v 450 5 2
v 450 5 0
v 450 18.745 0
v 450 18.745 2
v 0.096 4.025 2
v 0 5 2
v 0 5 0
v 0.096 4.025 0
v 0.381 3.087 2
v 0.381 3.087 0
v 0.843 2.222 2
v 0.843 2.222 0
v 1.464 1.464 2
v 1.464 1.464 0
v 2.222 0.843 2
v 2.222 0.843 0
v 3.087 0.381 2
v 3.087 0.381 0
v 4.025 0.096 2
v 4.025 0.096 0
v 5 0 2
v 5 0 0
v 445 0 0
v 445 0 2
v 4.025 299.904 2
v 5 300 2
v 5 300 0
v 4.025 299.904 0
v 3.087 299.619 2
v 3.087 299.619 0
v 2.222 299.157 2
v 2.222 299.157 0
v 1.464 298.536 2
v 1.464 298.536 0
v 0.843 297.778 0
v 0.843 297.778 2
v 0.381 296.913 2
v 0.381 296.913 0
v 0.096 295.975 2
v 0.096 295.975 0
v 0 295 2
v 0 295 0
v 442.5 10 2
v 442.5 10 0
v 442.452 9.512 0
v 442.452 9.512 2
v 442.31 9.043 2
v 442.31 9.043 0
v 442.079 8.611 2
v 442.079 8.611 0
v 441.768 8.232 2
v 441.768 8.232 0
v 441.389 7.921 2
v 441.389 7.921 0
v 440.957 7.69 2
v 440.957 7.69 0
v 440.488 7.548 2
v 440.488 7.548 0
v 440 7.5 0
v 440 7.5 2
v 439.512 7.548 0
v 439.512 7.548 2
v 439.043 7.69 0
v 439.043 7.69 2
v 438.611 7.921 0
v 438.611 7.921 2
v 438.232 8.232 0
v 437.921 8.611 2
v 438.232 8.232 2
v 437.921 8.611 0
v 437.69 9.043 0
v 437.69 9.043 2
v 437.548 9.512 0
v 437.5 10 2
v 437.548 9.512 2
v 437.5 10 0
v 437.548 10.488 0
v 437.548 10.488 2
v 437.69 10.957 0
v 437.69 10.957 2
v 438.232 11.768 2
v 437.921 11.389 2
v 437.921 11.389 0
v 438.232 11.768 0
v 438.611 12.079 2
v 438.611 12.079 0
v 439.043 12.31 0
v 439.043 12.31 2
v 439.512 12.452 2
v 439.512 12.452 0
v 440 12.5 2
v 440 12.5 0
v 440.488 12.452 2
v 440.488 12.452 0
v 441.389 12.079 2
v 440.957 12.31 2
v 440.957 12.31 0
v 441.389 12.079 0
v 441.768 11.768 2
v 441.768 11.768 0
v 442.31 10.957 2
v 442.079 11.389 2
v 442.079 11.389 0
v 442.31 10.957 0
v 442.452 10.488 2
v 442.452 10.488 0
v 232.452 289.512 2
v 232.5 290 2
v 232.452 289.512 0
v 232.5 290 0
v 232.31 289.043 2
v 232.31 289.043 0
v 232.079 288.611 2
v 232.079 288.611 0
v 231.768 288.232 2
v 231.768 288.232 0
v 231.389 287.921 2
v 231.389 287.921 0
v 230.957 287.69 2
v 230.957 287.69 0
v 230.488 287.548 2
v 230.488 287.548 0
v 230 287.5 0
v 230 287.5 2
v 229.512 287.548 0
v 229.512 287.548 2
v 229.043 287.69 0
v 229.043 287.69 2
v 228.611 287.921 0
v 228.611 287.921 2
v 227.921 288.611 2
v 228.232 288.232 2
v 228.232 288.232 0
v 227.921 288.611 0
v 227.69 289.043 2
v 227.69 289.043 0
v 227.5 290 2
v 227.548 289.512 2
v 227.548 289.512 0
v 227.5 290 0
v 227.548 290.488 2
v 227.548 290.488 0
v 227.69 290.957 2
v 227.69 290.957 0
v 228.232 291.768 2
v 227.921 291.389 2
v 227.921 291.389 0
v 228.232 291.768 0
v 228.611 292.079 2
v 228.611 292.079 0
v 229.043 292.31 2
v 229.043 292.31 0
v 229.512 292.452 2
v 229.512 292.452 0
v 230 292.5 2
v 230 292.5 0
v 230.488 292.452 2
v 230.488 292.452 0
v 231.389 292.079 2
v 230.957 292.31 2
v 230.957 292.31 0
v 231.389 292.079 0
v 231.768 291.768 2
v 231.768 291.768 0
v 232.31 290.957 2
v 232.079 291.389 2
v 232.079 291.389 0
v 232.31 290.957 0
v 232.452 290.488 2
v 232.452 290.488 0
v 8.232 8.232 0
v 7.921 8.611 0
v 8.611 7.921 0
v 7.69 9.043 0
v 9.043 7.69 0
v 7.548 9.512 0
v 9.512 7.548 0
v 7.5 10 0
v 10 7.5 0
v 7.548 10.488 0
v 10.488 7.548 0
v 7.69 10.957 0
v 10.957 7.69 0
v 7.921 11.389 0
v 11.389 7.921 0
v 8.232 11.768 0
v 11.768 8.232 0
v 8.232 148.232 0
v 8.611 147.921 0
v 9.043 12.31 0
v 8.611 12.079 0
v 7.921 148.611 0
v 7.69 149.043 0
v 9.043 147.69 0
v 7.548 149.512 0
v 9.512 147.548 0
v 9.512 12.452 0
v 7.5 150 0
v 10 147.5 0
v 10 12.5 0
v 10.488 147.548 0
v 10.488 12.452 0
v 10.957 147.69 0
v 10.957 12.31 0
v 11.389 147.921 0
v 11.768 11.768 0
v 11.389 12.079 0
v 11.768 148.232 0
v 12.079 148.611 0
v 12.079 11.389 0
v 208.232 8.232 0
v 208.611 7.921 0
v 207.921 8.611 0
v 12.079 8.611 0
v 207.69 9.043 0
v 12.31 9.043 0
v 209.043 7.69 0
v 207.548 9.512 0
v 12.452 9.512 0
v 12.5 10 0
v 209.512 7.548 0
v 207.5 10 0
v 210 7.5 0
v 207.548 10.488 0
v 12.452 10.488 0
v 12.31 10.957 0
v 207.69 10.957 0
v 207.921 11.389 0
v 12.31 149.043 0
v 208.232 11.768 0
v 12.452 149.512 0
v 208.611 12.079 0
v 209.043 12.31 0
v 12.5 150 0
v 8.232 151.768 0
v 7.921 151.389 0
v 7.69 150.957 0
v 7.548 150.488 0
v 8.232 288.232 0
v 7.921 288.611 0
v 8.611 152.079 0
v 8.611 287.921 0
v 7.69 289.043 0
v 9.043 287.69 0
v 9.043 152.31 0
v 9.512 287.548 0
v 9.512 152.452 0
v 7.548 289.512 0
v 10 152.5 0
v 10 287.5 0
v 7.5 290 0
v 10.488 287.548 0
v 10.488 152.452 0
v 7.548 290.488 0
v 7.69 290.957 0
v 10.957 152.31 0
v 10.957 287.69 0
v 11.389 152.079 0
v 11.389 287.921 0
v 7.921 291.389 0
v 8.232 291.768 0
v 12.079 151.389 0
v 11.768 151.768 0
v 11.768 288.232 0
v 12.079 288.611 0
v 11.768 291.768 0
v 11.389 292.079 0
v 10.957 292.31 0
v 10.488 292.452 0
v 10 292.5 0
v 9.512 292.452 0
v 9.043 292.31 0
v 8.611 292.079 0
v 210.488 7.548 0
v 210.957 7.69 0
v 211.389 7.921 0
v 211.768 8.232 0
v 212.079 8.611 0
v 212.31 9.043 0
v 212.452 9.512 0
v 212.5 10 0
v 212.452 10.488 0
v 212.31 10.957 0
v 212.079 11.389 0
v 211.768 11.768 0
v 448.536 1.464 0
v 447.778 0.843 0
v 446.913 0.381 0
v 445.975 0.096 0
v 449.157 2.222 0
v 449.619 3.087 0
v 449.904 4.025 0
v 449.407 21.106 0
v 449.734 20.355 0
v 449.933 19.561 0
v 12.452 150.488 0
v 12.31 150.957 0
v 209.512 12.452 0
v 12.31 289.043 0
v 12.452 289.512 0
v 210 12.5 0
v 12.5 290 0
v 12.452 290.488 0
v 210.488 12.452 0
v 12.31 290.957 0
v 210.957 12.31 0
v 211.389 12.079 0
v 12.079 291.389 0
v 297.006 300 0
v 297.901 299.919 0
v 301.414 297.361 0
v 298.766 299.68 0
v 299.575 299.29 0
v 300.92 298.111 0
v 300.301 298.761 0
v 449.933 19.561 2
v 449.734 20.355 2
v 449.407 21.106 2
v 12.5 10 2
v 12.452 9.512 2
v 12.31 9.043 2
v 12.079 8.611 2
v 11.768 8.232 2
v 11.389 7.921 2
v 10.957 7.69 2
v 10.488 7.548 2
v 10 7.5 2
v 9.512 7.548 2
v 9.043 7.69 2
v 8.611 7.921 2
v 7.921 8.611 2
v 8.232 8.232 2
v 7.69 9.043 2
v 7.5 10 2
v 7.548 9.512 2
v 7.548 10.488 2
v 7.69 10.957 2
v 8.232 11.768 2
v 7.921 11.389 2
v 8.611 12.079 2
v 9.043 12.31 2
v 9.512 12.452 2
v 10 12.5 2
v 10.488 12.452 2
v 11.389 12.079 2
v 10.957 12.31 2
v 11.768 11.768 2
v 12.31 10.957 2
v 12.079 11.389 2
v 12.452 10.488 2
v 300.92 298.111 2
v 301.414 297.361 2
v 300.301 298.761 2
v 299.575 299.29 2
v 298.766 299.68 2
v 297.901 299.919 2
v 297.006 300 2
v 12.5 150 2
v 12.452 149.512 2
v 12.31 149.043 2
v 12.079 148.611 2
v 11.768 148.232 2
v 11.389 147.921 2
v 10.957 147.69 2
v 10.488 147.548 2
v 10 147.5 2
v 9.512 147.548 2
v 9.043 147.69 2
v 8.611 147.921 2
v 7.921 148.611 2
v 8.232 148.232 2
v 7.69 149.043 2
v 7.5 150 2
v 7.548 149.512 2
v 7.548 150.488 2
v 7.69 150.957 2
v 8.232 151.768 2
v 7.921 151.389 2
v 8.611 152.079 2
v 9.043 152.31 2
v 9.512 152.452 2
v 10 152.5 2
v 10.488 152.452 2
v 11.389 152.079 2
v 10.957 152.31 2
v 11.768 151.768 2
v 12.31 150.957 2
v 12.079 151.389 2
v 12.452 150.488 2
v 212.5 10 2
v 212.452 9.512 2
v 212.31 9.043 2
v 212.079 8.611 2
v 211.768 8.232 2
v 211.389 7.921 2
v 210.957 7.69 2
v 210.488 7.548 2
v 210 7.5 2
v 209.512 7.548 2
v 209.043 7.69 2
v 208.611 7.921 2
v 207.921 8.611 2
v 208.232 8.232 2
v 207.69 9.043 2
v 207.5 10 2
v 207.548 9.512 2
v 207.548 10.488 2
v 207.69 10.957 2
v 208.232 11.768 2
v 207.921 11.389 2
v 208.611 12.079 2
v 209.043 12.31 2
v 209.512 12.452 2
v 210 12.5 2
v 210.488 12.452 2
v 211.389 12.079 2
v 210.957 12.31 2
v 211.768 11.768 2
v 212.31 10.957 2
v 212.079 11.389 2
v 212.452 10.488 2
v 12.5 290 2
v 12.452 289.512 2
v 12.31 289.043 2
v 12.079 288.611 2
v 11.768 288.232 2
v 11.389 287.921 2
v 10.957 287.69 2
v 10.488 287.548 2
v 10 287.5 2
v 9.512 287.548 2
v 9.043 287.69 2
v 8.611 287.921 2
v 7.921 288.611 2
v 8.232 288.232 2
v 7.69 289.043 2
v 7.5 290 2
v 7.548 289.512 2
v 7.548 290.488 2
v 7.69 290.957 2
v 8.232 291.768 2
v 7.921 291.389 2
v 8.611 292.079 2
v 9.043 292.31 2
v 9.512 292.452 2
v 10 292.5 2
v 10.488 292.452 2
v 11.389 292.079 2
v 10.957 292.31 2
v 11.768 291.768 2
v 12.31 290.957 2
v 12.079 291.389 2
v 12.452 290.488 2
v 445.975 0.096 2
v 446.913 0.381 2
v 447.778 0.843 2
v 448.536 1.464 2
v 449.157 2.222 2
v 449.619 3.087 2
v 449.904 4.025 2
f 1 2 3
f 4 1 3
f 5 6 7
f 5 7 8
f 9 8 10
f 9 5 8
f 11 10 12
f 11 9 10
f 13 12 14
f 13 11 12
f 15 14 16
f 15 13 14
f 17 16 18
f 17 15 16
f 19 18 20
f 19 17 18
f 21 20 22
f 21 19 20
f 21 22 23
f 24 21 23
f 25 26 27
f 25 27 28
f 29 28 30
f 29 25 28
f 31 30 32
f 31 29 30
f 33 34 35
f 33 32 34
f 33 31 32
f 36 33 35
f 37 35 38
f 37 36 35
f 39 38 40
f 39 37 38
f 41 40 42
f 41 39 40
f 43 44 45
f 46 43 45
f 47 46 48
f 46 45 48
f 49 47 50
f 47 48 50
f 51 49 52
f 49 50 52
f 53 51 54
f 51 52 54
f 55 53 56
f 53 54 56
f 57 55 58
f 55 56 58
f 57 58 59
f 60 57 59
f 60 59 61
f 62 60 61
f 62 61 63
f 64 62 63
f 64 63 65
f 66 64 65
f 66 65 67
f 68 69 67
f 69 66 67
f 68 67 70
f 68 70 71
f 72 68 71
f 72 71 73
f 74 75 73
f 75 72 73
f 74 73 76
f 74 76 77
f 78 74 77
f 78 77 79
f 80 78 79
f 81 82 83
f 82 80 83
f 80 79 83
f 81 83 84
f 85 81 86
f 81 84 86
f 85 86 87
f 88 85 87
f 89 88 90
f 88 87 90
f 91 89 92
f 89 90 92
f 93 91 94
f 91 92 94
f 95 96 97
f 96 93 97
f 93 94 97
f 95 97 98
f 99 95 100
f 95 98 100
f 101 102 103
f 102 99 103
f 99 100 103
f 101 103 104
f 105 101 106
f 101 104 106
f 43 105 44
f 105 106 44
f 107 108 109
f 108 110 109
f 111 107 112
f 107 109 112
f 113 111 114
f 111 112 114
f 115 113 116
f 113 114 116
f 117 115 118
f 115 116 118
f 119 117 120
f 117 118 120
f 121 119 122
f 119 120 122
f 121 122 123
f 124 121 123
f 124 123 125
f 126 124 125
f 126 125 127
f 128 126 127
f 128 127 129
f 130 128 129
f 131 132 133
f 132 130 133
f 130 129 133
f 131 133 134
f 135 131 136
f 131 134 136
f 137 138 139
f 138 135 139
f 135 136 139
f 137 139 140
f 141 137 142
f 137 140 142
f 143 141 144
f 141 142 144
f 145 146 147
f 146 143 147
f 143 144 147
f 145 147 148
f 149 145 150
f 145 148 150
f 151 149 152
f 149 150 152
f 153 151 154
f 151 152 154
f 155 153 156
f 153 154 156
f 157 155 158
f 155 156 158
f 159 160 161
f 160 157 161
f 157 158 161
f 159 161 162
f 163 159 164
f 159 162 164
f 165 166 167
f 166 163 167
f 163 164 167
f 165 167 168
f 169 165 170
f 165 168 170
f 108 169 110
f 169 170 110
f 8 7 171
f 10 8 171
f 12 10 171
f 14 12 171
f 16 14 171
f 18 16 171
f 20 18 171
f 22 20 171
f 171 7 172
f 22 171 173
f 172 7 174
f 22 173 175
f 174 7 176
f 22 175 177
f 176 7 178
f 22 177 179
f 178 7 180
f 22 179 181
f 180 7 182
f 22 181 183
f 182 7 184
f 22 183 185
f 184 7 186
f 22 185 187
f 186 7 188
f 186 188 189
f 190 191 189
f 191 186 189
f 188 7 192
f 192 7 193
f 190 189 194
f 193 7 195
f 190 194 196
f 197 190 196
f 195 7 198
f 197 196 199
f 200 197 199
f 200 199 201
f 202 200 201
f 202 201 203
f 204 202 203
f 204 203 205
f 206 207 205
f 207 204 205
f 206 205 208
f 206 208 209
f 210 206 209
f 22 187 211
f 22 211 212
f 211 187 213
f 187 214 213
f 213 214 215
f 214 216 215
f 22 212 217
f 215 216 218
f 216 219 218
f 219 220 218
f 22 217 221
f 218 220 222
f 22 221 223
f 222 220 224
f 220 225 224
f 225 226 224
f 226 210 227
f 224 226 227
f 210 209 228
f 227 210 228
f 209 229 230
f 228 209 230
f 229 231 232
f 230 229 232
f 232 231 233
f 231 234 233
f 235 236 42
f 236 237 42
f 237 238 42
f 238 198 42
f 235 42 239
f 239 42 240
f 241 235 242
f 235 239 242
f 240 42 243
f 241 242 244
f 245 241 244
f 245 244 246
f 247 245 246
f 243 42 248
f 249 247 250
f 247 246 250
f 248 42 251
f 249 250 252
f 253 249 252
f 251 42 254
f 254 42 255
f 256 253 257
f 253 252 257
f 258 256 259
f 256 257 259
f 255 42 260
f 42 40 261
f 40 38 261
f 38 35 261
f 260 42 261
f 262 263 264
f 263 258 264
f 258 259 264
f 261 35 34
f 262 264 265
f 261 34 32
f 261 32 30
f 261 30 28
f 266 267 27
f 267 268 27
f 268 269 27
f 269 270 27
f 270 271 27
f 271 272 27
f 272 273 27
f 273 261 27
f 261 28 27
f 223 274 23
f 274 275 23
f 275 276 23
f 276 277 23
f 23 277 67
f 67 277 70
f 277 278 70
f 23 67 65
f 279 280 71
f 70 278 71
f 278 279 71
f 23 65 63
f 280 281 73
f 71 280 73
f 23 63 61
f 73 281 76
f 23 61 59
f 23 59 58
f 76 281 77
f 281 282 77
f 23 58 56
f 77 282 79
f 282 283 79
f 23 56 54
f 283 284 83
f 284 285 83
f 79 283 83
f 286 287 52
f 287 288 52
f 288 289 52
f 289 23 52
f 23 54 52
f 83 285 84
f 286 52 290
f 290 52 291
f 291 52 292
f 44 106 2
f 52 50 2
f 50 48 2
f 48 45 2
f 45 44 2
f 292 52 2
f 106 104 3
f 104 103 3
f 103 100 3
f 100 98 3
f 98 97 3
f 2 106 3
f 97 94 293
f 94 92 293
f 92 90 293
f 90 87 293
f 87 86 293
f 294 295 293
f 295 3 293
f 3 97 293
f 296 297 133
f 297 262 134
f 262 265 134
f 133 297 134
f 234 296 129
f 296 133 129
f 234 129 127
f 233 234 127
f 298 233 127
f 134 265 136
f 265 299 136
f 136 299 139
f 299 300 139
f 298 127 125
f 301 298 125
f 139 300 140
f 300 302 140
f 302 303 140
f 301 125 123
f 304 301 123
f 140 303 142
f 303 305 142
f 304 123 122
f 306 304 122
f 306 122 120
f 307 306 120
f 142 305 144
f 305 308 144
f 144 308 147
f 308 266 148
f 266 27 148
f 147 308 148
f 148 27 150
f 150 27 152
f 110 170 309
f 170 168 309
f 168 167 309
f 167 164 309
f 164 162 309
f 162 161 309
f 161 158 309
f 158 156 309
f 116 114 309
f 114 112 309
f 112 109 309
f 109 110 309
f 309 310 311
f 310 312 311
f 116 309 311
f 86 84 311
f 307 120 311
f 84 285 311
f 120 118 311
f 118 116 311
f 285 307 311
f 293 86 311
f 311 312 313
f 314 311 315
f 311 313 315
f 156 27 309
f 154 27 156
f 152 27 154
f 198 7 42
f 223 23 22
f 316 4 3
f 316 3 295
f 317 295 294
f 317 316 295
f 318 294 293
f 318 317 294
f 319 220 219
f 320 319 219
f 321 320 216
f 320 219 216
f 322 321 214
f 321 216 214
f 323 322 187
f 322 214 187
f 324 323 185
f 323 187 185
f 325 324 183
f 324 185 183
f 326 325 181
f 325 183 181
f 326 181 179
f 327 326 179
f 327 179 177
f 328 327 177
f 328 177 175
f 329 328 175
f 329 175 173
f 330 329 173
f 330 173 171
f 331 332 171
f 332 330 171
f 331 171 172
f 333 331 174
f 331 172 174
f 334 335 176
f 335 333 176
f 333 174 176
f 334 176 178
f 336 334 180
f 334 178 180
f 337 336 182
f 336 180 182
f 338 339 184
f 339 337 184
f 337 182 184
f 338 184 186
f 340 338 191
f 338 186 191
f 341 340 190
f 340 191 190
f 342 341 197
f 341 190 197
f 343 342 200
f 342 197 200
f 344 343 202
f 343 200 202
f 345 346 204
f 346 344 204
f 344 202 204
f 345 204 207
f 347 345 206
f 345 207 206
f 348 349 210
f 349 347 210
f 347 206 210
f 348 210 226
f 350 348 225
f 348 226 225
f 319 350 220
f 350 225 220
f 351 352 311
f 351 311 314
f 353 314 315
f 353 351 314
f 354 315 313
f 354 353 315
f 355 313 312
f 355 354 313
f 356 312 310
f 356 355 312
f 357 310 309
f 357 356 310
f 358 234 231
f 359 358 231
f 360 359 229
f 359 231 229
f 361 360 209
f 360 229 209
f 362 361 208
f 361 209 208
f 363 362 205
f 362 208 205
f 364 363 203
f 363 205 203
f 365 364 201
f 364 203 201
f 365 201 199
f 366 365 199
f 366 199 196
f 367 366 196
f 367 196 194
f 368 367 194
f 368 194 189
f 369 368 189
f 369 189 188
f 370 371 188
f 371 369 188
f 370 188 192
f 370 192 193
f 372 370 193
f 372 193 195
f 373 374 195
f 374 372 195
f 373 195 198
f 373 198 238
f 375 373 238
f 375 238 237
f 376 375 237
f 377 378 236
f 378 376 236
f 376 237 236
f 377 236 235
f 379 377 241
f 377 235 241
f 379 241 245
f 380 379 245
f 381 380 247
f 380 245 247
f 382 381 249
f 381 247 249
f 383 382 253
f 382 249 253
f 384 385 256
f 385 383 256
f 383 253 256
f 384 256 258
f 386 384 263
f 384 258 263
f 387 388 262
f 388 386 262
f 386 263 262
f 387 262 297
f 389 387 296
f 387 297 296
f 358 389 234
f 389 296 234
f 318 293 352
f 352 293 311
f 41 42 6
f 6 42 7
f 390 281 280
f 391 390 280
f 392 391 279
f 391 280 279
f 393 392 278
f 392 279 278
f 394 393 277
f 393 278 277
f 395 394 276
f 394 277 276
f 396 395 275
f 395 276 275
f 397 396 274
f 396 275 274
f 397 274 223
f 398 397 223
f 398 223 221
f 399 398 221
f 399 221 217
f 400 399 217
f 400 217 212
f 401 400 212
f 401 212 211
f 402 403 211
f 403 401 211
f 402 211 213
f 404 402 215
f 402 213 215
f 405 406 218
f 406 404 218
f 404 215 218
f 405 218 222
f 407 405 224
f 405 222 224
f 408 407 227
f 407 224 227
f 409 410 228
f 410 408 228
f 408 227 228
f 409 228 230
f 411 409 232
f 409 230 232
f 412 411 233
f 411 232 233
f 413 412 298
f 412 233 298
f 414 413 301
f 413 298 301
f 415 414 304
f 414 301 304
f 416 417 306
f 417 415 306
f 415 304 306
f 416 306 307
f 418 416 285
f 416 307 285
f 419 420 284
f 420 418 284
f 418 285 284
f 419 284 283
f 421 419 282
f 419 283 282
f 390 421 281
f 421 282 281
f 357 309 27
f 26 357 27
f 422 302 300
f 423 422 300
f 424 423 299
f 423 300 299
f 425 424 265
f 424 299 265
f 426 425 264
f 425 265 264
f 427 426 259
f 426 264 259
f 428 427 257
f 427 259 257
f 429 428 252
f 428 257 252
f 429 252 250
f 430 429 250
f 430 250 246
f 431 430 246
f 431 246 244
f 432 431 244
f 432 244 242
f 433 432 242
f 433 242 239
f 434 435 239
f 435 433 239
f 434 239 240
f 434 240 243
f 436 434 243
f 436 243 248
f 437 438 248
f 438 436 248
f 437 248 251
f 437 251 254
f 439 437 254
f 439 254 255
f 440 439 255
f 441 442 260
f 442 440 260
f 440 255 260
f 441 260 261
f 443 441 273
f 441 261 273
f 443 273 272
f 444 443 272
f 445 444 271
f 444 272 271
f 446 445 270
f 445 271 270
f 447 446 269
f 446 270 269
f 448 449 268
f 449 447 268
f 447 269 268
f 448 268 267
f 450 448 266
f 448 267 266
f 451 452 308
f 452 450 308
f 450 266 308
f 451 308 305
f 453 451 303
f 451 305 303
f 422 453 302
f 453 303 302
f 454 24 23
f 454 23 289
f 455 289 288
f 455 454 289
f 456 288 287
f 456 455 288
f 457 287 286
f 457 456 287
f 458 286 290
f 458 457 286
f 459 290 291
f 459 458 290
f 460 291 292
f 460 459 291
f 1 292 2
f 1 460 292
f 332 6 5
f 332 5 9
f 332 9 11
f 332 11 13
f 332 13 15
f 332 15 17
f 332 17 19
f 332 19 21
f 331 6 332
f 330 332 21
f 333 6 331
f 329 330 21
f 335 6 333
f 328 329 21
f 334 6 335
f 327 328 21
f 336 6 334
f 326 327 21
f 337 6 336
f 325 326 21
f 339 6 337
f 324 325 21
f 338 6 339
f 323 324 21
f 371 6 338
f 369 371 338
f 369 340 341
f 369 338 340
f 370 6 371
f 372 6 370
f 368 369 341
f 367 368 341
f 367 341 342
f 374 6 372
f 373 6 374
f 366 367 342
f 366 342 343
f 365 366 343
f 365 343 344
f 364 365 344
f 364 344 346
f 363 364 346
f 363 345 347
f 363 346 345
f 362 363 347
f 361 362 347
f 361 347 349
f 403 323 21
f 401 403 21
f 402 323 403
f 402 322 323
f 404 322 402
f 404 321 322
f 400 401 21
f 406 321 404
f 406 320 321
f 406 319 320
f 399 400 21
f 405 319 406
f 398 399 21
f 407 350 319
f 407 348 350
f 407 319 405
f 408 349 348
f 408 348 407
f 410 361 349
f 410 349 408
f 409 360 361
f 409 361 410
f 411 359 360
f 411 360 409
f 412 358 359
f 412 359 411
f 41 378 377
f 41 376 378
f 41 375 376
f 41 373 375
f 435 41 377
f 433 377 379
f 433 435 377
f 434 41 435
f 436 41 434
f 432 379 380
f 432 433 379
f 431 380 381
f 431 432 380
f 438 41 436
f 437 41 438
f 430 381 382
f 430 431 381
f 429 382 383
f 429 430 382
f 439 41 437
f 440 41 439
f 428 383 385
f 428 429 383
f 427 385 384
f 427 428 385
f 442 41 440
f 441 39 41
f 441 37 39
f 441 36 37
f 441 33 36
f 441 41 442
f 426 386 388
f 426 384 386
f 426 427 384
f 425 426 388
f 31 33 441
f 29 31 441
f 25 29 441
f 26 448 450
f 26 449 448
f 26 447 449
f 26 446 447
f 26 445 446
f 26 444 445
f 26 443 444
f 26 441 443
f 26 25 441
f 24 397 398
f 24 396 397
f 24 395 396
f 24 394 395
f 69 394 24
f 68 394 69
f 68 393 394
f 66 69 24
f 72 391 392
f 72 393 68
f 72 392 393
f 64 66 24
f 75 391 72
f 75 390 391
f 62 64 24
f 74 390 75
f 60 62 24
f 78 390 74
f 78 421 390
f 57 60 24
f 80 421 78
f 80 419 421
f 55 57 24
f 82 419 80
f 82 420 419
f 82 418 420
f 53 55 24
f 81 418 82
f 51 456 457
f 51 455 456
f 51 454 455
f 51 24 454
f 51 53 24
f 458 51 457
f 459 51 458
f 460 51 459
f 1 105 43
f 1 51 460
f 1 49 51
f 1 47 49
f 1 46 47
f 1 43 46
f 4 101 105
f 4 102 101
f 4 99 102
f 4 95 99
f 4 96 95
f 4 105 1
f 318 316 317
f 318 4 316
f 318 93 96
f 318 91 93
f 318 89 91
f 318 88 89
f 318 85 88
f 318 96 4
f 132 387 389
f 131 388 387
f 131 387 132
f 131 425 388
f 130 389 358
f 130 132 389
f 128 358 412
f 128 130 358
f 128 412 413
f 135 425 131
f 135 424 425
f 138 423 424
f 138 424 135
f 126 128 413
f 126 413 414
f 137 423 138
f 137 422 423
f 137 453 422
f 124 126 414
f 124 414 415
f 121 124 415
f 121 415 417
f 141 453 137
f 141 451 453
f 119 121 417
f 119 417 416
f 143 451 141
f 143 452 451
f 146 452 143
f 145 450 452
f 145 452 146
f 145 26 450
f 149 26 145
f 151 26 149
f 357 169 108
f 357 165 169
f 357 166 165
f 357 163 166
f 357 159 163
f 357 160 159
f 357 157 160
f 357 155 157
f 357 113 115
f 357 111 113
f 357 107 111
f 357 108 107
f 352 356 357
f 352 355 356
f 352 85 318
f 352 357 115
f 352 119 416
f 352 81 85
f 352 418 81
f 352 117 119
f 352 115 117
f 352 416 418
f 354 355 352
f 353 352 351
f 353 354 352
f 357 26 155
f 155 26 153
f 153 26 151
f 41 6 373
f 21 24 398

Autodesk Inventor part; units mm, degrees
ref_plane "YZ Plane" through (0, 0, 0) normal (1, 0, 0) x (0, 1, 0)
ref_plane "XZ Plane" through (0, 0, 0) normal (0, 1, 0) x (-1, 0, 0)
ref_plane "XY Plane" through (0, 0, 0) normal (0, 0, 1) x (1, 0, 0)
sketch "スケッチ1" plane through (0, 0, 0) normal (0, 0, 1) x (1, 0, 0)
  line L0 (0, 0) -> (450, 0)
  line L1 (450, 0) -> (450, 20)
  line L2 (450, 20) -> (300, 300)
  line L3 (300, 300) -> (0, 300)
  line L4 (0, 300) -> (0, 0)
  line L5 (10, 290) -> (294.0126, 290) construction
  line L6 (294.0126, 290) -> (444.0126, 10) construction
  line L7 (444.0126, 10) -> (10, 10) construction
  line L8 (10, 10) -> (10, 290) construction
  circle A0 centre (10, 290) radius 2.5
  circle A1 centre (10, 10) radius 2.5
  circle A2 centre (10, 150) radius 2.5
  circle A3 centre (210, 10) radius 2.5
  circle A4 centre (440, 10) radius 2.5
  circle A5 centre (230, 290) radius 2.5
  dimension "d0" = 300
  dimension "d1" = 450
  dimension "d2" = 300
  dimension "d3" = 20
  dimension "d6" = 10
  dimension "d7" = 5
  dimension "d8" = 10
  dimension "d9" = 200
  dimension "d10" = 220
extrude "押し出し1" add sketch "スケッチ1" along normal blind 2
fillet "フィレット1" radius 5 5 edges at (450, 0, 1) (450, 20, 1) (0, 0, 1) (300, 300, 1) (0, 300, 1)
properties part number "防水1" material "PET プラスチック"
